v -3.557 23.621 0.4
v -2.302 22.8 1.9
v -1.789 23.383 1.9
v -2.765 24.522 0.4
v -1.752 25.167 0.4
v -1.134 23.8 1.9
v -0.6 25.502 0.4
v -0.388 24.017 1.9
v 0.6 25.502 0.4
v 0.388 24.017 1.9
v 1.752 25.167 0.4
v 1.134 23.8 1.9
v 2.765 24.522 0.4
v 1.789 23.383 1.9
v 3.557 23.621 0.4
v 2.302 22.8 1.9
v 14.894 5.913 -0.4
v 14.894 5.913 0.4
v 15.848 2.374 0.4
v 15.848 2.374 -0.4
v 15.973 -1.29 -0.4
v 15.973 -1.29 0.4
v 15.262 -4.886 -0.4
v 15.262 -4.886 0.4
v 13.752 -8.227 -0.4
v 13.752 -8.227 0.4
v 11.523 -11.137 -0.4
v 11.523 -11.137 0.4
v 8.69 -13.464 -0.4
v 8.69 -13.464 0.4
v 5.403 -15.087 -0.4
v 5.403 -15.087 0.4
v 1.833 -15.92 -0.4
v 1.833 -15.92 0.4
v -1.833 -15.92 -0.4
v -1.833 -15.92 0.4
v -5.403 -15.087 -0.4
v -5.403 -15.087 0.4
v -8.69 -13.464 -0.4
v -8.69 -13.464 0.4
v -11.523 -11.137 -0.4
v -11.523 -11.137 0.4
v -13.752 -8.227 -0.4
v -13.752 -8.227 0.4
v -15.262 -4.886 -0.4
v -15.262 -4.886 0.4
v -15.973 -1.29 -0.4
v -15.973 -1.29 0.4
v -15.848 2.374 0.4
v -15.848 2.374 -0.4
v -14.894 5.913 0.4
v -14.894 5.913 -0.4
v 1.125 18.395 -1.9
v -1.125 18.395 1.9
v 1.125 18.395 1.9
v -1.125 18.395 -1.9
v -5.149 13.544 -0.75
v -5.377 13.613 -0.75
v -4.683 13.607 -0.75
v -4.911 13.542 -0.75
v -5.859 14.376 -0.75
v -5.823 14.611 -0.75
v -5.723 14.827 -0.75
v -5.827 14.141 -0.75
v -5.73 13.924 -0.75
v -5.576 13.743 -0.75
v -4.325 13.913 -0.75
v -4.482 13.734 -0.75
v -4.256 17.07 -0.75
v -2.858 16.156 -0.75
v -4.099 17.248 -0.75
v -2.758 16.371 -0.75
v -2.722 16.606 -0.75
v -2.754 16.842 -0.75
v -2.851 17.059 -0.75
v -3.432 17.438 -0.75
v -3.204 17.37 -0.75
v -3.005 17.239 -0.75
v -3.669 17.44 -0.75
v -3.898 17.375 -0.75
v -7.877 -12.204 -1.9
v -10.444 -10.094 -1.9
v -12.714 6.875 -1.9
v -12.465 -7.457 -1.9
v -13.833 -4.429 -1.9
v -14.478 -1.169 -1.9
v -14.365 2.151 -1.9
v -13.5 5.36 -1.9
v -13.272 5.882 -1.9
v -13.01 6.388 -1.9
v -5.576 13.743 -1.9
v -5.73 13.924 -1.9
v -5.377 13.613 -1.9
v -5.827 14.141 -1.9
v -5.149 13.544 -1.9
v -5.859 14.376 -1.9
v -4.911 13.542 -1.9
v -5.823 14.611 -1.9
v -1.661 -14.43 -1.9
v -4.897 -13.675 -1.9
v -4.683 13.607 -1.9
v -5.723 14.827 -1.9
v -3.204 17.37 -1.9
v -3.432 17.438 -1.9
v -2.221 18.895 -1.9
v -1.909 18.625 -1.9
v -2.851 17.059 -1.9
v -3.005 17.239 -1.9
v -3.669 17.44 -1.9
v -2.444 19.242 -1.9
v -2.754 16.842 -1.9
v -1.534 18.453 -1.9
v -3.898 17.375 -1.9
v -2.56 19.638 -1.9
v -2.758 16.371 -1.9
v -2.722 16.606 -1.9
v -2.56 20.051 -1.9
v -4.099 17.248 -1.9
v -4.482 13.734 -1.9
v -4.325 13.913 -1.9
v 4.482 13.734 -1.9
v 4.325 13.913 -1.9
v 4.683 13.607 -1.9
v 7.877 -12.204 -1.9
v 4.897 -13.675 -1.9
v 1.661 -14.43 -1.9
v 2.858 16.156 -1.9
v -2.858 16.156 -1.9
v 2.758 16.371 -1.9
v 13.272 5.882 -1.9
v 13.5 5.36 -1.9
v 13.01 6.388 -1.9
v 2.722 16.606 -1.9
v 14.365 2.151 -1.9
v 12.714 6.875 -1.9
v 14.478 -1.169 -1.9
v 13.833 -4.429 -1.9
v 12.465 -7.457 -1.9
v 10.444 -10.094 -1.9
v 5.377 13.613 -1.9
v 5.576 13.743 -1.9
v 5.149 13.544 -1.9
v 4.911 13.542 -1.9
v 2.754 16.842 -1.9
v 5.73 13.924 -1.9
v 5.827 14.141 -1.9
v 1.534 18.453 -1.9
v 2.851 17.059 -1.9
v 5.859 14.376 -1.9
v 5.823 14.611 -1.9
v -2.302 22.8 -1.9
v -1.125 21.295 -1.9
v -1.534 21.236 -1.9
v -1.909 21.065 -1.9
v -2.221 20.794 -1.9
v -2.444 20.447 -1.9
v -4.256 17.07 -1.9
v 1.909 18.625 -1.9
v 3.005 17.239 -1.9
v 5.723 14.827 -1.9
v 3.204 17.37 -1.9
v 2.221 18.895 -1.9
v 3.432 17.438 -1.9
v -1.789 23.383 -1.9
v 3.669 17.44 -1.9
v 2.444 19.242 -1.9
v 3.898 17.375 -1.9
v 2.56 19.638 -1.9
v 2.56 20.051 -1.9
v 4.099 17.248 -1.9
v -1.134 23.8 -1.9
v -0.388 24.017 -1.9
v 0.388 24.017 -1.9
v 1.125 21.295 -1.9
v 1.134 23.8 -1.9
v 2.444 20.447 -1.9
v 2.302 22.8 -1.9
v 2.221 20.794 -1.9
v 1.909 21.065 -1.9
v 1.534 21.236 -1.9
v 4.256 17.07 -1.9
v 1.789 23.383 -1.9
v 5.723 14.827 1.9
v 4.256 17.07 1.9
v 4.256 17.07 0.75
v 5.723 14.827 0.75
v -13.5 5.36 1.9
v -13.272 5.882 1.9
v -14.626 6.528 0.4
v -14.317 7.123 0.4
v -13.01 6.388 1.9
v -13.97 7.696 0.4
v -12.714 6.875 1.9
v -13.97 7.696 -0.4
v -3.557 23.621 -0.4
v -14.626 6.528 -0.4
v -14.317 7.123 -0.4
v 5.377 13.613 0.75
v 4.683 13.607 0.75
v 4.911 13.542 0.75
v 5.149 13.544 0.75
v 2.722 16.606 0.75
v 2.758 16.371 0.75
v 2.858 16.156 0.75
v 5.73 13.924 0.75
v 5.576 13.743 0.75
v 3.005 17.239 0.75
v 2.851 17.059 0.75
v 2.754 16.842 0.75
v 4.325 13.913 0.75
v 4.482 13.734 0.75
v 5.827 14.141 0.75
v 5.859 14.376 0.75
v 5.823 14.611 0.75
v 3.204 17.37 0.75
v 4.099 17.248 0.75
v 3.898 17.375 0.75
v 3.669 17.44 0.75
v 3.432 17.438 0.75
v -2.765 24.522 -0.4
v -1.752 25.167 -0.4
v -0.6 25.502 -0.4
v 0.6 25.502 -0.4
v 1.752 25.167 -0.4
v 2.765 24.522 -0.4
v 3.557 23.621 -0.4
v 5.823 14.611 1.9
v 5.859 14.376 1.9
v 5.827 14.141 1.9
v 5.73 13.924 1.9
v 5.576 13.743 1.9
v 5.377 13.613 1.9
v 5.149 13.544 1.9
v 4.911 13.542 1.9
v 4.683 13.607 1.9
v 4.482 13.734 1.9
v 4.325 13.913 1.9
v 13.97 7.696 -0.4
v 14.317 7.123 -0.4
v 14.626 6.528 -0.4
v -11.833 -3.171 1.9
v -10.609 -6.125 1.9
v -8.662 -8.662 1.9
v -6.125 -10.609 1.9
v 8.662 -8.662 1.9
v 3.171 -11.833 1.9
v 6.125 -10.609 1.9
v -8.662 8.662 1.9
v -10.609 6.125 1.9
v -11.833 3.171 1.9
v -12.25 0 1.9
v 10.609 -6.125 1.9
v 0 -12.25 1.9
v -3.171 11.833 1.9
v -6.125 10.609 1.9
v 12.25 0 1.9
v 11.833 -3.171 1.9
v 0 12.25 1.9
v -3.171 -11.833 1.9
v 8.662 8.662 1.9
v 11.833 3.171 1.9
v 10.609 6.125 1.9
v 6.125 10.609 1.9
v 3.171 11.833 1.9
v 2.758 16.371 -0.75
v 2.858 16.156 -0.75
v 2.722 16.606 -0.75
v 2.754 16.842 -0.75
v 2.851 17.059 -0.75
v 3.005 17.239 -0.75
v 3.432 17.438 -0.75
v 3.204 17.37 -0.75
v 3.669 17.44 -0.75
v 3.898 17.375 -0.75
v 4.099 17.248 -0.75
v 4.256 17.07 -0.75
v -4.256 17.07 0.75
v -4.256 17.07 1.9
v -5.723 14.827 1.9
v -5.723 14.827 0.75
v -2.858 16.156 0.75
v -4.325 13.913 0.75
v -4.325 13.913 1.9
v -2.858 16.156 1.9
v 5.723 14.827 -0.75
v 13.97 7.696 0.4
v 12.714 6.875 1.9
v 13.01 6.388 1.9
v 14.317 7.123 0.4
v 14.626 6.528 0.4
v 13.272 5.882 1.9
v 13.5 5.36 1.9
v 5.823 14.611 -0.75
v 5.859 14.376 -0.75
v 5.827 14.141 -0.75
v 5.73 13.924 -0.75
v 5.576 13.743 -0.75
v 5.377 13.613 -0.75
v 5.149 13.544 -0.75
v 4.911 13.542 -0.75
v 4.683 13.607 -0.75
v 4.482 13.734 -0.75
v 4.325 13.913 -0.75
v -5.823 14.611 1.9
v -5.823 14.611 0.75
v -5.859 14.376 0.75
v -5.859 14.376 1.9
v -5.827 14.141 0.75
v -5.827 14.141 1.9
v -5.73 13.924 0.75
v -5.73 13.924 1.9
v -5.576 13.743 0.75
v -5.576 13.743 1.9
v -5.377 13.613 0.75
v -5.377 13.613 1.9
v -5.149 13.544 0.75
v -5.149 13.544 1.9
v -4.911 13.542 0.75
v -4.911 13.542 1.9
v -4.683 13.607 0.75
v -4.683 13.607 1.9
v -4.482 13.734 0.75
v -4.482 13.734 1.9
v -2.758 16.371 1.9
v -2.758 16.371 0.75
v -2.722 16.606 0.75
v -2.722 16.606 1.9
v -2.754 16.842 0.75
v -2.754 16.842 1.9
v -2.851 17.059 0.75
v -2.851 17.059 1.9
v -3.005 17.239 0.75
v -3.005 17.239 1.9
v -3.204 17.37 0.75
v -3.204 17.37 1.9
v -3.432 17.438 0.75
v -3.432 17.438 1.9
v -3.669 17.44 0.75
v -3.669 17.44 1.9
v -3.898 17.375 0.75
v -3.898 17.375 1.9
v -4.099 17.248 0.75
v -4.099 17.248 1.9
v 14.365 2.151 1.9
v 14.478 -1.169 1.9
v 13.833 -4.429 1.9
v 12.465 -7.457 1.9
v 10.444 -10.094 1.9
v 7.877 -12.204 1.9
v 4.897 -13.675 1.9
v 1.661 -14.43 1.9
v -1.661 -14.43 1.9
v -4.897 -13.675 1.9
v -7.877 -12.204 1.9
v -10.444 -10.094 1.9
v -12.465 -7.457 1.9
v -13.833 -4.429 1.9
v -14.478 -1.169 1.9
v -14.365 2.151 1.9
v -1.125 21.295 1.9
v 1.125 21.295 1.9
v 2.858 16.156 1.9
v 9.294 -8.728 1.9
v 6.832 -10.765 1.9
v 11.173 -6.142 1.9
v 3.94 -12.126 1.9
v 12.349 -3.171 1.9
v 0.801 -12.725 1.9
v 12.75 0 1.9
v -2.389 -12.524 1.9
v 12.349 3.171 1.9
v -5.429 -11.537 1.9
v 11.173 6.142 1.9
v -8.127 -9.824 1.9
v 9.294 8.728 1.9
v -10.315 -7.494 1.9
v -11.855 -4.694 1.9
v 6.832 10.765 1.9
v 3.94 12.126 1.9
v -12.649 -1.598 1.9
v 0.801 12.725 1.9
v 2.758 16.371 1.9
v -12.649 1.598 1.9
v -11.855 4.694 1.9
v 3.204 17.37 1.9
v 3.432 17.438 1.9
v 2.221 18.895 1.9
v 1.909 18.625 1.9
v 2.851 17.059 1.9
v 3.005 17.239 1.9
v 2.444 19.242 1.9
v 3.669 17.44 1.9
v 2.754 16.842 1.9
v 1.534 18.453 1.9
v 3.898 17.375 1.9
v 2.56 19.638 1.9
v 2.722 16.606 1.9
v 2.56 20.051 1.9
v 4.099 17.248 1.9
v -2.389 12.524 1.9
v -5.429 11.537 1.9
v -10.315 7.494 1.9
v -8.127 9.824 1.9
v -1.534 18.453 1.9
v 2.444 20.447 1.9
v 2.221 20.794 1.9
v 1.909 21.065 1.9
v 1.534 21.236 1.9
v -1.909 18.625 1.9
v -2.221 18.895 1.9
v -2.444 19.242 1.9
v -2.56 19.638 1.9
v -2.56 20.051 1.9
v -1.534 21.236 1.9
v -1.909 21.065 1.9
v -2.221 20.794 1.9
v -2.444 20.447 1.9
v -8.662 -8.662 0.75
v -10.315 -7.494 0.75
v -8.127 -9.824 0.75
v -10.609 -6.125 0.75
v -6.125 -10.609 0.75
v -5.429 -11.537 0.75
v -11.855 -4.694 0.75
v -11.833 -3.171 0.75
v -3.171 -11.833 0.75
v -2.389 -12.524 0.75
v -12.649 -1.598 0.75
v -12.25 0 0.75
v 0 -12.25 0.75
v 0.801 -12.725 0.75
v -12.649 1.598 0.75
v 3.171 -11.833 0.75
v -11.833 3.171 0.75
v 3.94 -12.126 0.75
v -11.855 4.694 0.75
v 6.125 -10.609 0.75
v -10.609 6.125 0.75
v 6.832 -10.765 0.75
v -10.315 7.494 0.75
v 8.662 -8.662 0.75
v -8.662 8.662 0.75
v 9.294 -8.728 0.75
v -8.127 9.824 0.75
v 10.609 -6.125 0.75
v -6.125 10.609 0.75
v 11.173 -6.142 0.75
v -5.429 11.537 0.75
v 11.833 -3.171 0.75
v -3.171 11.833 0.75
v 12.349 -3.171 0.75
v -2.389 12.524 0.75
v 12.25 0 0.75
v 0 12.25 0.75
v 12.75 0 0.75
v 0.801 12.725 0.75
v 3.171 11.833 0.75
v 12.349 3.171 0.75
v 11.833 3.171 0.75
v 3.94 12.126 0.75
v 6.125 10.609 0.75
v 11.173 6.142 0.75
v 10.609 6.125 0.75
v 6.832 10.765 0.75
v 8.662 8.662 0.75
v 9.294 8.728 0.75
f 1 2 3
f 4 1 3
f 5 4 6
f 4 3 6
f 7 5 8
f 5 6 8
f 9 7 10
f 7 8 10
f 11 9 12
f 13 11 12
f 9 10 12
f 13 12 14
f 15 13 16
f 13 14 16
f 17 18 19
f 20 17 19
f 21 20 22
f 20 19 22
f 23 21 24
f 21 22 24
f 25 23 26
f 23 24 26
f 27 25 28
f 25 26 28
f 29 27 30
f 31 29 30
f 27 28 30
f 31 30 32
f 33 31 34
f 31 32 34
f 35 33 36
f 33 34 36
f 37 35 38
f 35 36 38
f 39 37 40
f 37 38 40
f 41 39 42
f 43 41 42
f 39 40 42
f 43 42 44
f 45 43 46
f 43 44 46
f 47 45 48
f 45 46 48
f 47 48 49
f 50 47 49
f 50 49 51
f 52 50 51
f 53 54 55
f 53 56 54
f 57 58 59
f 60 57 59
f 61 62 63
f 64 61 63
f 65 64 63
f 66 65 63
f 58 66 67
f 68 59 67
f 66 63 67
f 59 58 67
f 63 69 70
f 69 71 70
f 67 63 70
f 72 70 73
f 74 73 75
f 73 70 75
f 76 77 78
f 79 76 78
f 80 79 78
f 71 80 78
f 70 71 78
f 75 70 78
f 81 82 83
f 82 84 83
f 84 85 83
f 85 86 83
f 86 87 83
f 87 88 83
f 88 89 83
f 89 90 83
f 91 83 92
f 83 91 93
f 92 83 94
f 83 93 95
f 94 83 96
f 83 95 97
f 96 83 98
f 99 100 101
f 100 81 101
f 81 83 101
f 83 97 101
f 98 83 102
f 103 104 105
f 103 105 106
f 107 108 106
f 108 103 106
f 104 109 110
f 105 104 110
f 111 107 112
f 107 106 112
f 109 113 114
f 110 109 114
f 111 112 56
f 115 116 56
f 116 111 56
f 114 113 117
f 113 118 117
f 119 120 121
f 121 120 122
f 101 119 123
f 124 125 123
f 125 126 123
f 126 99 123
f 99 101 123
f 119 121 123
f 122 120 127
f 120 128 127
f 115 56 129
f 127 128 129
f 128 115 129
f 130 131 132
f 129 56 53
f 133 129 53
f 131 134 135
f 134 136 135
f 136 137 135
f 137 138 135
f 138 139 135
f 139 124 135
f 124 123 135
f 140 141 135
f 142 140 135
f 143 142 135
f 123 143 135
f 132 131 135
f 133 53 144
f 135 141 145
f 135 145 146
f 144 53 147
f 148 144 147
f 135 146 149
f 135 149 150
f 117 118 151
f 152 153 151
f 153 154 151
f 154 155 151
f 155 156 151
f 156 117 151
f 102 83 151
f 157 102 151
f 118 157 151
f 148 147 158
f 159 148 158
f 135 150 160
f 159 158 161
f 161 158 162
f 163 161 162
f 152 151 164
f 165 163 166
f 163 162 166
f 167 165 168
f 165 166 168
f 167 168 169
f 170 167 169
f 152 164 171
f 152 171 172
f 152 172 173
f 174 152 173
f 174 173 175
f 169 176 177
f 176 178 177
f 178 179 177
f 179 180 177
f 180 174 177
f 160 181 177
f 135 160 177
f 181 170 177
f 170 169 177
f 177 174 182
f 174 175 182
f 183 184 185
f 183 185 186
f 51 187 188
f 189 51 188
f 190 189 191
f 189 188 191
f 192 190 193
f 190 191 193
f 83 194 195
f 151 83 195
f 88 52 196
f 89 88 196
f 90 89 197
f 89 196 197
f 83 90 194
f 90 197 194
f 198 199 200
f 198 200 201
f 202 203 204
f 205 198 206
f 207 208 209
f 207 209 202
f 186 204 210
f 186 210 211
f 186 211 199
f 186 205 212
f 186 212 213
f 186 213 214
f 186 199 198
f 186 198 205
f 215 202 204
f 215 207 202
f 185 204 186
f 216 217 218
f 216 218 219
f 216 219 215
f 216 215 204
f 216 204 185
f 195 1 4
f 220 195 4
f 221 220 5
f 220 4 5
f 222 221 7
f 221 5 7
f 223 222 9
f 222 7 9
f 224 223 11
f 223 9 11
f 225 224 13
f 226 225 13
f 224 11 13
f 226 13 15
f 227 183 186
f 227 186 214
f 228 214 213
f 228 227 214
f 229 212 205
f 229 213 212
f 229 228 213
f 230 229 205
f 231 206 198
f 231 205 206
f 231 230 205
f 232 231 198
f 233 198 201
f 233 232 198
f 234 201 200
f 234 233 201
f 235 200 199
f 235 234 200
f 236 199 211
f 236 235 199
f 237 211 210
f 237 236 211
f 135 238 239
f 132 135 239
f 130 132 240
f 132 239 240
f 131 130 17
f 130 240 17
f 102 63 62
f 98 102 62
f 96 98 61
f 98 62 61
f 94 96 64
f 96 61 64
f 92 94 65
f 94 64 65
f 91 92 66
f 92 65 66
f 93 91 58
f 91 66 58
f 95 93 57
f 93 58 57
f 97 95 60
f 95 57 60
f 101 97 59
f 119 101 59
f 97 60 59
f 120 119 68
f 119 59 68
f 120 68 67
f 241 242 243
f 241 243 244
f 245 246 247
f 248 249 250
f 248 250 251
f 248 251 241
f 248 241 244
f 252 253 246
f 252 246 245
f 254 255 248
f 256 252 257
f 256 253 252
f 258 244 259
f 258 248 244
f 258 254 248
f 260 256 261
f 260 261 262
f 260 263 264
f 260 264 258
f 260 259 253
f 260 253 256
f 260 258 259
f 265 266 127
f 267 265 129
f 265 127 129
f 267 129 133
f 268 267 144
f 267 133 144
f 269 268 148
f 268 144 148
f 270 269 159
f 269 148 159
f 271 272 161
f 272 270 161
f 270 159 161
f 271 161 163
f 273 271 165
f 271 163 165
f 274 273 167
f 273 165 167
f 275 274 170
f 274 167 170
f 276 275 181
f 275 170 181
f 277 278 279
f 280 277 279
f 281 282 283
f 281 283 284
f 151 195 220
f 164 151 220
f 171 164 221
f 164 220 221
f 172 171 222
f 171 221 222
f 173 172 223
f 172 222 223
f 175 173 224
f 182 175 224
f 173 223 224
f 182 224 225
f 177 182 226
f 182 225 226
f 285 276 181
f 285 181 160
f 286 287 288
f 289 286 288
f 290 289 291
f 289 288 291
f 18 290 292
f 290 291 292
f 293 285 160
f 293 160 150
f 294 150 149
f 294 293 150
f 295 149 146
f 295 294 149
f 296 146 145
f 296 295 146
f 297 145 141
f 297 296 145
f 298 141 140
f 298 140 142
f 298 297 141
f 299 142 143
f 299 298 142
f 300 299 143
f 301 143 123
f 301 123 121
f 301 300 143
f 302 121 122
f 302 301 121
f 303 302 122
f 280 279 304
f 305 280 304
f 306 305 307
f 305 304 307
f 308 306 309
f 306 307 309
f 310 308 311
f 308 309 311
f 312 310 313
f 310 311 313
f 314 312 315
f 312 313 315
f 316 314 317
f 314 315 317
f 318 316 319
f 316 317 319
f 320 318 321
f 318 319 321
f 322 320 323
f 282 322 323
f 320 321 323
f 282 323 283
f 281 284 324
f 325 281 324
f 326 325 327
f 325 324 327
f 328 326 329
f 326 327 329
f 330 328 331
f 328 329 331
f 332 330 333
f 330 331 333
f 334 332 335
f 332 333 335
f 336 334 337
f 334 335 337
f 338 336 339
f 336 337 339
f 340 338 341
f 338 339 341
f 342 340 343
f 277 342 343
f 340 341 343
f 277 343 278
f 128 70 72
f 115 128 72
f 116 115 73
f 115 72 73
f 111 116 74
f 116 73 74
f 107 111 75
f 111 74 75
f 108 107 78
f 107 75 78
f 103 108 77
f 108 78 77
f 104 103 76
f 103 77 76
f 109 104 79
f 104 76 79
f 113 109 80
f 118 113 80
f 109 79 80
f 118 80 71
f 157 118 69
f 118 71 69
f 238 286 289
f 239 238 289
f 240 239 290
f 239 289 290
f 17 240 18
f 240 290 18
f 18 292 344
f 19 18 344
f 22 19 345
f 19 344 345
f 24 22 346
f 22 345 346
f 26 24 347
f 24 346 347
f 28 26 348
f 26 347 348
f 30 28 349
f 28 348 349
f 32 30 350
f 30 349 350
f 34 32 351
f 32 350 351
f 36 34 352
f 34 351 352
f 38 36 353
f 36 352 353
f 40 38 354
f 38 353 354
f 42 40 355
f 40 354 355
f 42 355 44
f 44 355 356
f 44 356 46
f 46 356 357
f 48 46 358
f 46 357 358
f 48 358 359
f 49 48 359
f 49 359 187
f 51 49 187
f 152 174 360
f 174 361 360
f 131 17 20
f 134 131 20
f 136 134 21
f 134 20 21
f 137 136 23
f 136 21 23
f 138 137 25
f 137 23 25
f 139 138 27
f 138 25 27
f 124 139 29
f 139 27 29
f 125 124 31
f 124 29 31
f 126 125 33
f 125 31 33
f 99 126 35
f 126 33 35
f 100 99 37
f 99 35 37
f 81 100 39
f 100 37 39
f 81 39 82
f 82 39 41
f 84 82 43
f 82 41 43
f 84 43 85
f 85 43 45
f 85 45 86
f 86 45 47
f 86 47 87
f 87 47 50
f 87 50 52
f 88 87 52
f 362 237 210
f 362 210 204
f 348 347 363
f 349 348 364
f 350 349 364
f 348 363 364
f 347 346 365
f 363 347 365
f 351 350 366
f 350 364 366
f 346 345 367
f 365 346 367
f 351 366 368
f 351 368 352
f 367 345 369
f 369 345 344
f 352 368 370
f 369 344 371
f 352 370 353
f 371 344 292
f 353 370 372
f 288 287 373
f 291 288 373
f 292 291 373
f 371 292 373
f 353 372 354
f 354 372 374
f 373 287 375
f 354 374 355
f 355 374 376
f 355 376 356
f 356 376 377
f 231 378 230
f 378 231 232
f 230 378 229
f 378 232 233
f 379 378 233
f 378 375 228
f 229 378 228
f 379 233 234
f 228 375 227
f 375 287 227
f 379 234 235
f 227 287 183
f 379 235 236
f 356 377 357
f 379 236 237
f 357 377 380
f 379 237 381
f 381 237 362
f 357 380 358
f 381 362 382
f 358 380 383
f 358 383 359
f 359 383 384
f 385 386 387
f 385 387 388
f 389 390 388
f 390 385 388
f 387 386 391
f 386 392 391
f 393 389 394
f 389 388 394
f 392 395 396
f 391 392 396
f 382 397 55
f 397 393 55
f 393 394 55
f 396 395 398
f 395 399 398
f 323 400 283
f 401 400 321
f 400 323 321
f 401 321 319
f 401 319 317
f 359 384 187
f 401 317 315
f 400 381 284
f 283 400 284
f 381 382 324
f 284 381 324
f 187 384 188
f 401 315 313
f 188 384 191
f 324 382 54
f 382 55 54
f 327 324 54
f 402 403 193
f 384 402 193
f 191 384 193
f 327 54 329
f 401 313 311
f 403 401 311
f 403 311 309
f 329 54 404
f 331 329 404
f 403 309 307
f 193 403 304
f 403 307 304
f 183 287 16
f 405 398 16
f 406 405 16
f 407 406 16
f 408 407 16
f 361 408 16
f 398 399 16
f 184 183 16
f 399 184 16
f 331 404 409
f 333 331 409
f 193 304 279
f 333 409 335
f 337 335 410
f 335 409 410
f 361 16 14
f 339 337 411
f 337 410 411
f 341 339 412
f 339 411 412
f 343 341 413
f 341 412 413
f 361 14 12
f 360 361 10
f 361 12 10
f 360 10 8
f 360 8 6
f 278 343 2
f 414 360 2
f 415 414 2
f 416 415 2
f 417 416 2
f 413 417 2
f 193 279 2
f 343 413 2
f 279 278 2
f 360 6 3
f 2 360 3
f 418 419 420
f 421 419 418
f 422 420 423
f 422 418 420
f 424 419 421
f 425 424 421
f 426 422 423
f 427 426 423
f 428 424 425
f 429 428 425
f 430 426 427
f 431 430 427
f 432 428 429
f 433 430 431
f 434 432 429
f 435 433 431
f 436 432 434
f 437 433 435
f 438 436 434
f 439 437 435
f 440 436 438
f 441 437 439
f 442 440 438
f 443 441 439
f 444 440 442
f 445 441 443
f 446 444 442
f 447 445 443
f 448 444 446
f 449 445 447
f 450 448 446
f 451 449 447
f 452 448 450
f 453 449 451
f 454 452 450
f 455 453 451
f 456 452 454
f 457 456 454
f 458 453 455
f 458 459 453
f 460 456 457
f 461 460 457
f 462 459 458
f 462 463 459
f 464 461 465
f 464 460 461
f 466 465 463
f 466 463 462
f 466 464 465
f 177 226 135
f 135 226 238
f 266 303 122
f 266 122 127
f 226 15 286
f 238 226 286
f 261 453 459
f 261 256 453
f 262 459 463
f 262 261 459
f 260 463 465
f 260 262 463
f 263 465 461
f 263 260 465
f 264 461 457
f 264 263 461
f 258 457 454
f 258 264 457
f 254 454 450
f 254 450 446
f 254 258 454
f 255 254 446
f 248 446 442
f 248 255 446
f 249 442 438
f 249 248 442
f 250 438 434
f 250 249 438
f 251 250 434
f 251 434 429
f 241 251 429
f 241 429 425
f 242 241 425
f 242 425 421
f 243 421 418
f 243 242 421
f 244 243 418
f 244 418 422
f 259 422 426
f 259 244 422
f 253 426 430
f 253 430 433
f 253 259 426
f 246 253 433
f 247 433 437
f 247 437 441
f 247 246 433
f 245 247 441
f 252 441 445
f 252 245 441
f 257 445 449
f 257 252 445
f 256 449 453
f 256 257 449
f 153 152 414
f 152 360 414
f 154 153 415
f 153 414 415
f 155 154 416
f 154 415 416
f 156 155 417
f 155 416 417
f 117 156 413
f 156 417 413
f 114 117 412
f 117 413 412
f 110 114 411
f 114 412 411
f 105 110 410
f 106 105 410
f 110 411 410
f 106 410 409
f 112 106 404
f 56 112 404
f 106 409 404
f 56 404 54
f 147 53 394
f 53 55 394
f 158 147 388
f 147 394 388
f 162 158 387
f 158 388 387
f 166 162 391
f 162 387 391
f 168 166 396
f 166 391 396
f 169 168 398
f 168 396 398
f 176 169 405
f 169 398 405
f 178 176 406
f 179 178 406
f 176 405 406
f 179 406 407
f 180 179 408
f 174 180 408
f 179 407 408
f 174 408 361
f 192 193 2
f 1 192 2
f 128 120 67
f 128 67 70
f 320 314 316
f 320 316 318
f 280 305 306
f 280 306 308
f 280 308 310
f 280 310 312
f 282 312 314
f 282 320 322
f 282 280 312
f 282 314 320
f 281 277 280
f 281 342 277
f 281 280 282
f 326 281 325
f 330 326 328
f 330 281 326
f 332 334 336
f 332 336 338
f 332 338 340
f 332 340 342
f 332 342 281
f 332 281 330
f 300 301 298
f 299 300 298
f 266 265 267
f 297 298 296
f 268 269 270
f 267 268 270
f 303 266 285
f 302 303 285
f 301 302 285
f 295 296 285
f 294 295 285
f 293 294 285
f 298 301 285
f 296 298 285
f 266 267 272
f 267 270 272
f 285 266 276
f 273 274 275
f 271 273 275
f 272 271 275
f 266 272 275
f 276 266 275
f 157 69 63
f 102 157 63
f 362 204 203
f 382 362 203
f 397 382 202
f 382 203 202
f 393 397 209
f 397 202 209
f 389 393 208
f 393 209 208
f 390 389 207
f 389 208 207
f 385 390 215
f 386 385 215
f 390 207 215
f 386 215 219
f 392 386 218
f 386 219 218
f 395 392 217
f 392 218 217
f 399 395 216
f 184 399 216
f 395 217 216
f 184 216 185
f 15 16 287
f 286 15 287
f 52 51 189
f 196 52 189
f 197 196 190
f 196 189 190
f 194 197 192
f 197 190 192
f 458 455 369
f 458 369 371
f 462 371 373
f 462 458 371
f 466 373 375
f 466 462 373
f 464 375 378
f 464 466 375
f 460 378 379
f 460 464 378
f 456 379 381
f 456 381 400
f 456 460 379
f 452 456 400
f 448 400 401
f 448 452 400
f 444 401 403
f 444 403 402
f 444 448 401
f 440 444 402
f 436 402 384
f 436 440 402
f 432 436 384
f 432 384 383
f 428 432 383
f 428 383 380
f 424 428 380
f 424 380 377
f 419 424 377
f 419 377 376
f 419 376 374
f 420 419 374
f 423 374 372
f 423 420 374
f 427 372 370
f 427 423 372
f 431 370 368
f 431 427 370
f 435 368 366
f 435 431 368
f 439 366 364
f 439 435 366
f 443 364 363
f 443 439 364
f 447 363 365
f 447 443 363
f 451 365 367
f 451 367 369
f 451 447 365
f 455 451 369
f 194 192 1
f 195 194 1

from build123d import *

# Parameters (mm, degrees)
ESBO_O1_R                  = 12.75
RESSALTO_EXTRUS_O1_DEPTH   = 1.9
ESBO_O1_R_2                = 12.25
RESSALTO_EXTRUS_O1_2_DEPTH = 1.9
ESBO_O1_3_R                = 12.75
ESBO_O1_3_R_2              = 12.25
RESSALTO_EXTRUS_O2_DEPTH   = 0.75
CHANFRO1_SIZE              = 1.5
ESBO_O1_4_R                = 12.75
ESBO_O1_4_R_2              = 12.25
RESSALTO_EXTRUS_O3_DEPTH   = 1.9


with BuildPart() as part:
    # Esboço1 → Ressalto-extrusão1 (new, symmetric)
    with BuildSketch(Plane.XY):
        with BuildLine():
            Line((-3.557120859, 23.620523756), (-13.969531124, 7.695660998))
            ThreePointArc((-13.969531124, 7.695660998), (-14.476708195, 6.827634982), (-14.894166908, 5.913071715))
            ThreePointArc((-14.894166908, 5.913071715), (0, -16.025), (14.894166908, 5.913071715))
            ThreePointArc((14.894166908, 5.913071715), (14.476708195, 6.827634982), (13.969531124, 7.695660998))
            Line((13.969531124, 7.695660998), (3.557120859, 23.620523756))
            ThreePointArc((3.557120859, 23.620523756), (0, 25.544713963), (-3.557120859, 23.620523756))
        make_face()
        Circle(ESBO_O1_R, mode=Mode.SUBTRACT)
        with BuildLine():
            ThreePointArc((-4.255990487, 17.069702714), (-3.100167641, 17.311619123), (-2.858251232, 16.155796277))
            Line((-2.858251232, 16.155796277), (-4.324879525, 13.912717712))
            ThreePointArc((-4.324879525, 13.912717712), (-5.48070237, 13.670801302), (-5.72261878, 14.826624148))
            Line((-5.72261878, 14.826624148), (-4.255990487, 17.069702714))
        make_face(mode=Mode.SUBTRACT)
        with BuildLine():
            ThreePointArc((1.125, 21.294713963), (2.575, 19.844713963), (1.125, 18.394713963))
            Line((1.125, 18.394713963), (-1.125, 18.394713963))
            ThreePointArc((-1.125, 18.394713963), (-2.575, 19.844713963), (-1.125, 21.294713963))
            Line((-1.125, 21.294713963), (1.125, 21.294713963))
        make_face(mode=Mode.SUBTRACT)
        with BuildLine():
            Line((4.324879525, 13.912717712), (2.858251232, 16.155796277))
            ThreePointArc((2.858251232, 16.155796277), (3.100167641, 17.311619123), (4.255990487, 17.069702714))
            Line((4.255990487, 17.069702714), (5.72261878, 14.826624148))
            ThreePointArc((5.72261878, 14.826624148), (5.48070237, 13.670801302), (4.324879525, 13.912717712))
        make_face(mode=Mode.SUBTRACT)
    extrude(amount=RESSALTO_EXTRUS_O1_DEPTH, both=True)



with BuildPart() as body_2:
    # Esboço1 → Ressalto-extrus_o1 2 (new, symmetric)
    with BuildSketch(Plane.XY):
        Circle(ESBO_O1_R_2)
    extrude(amount=RESSALTO_EXTRUS_O1_2_DEPTH, both=True)


with BuildPart() as part_1:
    add(part.part)

    add(body_2.part)  # Ressalto-extrusão2 merges body 2
    # Esboço1<3> → Ressalto-extrusão2 (add, symmetric)
    # profile 1 of 3: a face of its own
    with BuildSketch(Plane.XY):
        with BuildLine():
            Line((-4.324879525, 13.912717712), (-2.858251232, 16.155796277))
            ThreePointArc((-2.858251232, 16.155796277), (-3.100167641, 17.311619123), (-4.255990487, 17.069702714))
            Line((-4.255990487, 17.069702714), (-5.72261878, 14.826624148))
            ThreePointArc((-5.72261878, 14.826624148), (-5.48070237, 13.670801302), (-4.324879525, 13.912717712))
        make_face()
    # profile 2 of 3: a face of its own
    with BuildSketch(Plane.XY):
        with BuildLine():
            ThreePointArc((4.255990487, 17.069702714), (3.100167641, 17.311619123), (2.858251232, 16.155796277))
            Line((2.858251232, 16.155796277), (4.324879525, 13.912717712))
            ThreePointArc((4.324879525, 13.912717712), (5.48070237, 13.670801302), (5.72261878, 14.826624148))
            Line((5.72261878, 14.826624148), (4.255990487, 17.069702714))
        make_face()
    # profile 3 of 3: a face of its own
    with BuildSketch(Plane.XY):
        Circle(ESBO_O1_3_R)
        Circle(ESBO_O1_3_R_2, mode=Mode.SUBTRACT)
    extrude(amount=RESSALTO_EXTRUS_O2_DEPTH, both=True)

    # Chanfro1
    chanfro1_edges = [part_1.edges().sort_by_distance(p)[0] for p in [
        (-14.476708195, 6.827634982, -1.9),
        (0, -16.025, -1.9),
        (-8.763325992, 15.658092377, -1.9),
        (14.476708195, 6.827634982, -1.9),
        (0, 25.544713963, -1.9),
        (8.763325992, 15.658092377, -1.9),
        (0, -16.025, 1.9),
        (14.476708195, 6.827634982, 1.9),
        (-14.476708195, 6.827634982, 1.9),
        (8.763325992, 15.658092377, 1.9),
        (-8.763325992, 15.658092377, 1.9),
        (0, 25.544713963, 1.9),
    ]]
    chamfer(chanfro1_edges, length=CHANFRO1_SIZE)

    # Esboço1<4> → Ressalto-extrusão3 (add)
    with BuildSketch(Plane.XY):
        Circle(ESBO_O1_4_R)
        Circle(ESBO_O1_4_R_2, mode=Mode.SUBTRACT)
    extrude(amount=-RESSALTO_EXTRUS_O3_DEPTH)


solid = part_1.part
